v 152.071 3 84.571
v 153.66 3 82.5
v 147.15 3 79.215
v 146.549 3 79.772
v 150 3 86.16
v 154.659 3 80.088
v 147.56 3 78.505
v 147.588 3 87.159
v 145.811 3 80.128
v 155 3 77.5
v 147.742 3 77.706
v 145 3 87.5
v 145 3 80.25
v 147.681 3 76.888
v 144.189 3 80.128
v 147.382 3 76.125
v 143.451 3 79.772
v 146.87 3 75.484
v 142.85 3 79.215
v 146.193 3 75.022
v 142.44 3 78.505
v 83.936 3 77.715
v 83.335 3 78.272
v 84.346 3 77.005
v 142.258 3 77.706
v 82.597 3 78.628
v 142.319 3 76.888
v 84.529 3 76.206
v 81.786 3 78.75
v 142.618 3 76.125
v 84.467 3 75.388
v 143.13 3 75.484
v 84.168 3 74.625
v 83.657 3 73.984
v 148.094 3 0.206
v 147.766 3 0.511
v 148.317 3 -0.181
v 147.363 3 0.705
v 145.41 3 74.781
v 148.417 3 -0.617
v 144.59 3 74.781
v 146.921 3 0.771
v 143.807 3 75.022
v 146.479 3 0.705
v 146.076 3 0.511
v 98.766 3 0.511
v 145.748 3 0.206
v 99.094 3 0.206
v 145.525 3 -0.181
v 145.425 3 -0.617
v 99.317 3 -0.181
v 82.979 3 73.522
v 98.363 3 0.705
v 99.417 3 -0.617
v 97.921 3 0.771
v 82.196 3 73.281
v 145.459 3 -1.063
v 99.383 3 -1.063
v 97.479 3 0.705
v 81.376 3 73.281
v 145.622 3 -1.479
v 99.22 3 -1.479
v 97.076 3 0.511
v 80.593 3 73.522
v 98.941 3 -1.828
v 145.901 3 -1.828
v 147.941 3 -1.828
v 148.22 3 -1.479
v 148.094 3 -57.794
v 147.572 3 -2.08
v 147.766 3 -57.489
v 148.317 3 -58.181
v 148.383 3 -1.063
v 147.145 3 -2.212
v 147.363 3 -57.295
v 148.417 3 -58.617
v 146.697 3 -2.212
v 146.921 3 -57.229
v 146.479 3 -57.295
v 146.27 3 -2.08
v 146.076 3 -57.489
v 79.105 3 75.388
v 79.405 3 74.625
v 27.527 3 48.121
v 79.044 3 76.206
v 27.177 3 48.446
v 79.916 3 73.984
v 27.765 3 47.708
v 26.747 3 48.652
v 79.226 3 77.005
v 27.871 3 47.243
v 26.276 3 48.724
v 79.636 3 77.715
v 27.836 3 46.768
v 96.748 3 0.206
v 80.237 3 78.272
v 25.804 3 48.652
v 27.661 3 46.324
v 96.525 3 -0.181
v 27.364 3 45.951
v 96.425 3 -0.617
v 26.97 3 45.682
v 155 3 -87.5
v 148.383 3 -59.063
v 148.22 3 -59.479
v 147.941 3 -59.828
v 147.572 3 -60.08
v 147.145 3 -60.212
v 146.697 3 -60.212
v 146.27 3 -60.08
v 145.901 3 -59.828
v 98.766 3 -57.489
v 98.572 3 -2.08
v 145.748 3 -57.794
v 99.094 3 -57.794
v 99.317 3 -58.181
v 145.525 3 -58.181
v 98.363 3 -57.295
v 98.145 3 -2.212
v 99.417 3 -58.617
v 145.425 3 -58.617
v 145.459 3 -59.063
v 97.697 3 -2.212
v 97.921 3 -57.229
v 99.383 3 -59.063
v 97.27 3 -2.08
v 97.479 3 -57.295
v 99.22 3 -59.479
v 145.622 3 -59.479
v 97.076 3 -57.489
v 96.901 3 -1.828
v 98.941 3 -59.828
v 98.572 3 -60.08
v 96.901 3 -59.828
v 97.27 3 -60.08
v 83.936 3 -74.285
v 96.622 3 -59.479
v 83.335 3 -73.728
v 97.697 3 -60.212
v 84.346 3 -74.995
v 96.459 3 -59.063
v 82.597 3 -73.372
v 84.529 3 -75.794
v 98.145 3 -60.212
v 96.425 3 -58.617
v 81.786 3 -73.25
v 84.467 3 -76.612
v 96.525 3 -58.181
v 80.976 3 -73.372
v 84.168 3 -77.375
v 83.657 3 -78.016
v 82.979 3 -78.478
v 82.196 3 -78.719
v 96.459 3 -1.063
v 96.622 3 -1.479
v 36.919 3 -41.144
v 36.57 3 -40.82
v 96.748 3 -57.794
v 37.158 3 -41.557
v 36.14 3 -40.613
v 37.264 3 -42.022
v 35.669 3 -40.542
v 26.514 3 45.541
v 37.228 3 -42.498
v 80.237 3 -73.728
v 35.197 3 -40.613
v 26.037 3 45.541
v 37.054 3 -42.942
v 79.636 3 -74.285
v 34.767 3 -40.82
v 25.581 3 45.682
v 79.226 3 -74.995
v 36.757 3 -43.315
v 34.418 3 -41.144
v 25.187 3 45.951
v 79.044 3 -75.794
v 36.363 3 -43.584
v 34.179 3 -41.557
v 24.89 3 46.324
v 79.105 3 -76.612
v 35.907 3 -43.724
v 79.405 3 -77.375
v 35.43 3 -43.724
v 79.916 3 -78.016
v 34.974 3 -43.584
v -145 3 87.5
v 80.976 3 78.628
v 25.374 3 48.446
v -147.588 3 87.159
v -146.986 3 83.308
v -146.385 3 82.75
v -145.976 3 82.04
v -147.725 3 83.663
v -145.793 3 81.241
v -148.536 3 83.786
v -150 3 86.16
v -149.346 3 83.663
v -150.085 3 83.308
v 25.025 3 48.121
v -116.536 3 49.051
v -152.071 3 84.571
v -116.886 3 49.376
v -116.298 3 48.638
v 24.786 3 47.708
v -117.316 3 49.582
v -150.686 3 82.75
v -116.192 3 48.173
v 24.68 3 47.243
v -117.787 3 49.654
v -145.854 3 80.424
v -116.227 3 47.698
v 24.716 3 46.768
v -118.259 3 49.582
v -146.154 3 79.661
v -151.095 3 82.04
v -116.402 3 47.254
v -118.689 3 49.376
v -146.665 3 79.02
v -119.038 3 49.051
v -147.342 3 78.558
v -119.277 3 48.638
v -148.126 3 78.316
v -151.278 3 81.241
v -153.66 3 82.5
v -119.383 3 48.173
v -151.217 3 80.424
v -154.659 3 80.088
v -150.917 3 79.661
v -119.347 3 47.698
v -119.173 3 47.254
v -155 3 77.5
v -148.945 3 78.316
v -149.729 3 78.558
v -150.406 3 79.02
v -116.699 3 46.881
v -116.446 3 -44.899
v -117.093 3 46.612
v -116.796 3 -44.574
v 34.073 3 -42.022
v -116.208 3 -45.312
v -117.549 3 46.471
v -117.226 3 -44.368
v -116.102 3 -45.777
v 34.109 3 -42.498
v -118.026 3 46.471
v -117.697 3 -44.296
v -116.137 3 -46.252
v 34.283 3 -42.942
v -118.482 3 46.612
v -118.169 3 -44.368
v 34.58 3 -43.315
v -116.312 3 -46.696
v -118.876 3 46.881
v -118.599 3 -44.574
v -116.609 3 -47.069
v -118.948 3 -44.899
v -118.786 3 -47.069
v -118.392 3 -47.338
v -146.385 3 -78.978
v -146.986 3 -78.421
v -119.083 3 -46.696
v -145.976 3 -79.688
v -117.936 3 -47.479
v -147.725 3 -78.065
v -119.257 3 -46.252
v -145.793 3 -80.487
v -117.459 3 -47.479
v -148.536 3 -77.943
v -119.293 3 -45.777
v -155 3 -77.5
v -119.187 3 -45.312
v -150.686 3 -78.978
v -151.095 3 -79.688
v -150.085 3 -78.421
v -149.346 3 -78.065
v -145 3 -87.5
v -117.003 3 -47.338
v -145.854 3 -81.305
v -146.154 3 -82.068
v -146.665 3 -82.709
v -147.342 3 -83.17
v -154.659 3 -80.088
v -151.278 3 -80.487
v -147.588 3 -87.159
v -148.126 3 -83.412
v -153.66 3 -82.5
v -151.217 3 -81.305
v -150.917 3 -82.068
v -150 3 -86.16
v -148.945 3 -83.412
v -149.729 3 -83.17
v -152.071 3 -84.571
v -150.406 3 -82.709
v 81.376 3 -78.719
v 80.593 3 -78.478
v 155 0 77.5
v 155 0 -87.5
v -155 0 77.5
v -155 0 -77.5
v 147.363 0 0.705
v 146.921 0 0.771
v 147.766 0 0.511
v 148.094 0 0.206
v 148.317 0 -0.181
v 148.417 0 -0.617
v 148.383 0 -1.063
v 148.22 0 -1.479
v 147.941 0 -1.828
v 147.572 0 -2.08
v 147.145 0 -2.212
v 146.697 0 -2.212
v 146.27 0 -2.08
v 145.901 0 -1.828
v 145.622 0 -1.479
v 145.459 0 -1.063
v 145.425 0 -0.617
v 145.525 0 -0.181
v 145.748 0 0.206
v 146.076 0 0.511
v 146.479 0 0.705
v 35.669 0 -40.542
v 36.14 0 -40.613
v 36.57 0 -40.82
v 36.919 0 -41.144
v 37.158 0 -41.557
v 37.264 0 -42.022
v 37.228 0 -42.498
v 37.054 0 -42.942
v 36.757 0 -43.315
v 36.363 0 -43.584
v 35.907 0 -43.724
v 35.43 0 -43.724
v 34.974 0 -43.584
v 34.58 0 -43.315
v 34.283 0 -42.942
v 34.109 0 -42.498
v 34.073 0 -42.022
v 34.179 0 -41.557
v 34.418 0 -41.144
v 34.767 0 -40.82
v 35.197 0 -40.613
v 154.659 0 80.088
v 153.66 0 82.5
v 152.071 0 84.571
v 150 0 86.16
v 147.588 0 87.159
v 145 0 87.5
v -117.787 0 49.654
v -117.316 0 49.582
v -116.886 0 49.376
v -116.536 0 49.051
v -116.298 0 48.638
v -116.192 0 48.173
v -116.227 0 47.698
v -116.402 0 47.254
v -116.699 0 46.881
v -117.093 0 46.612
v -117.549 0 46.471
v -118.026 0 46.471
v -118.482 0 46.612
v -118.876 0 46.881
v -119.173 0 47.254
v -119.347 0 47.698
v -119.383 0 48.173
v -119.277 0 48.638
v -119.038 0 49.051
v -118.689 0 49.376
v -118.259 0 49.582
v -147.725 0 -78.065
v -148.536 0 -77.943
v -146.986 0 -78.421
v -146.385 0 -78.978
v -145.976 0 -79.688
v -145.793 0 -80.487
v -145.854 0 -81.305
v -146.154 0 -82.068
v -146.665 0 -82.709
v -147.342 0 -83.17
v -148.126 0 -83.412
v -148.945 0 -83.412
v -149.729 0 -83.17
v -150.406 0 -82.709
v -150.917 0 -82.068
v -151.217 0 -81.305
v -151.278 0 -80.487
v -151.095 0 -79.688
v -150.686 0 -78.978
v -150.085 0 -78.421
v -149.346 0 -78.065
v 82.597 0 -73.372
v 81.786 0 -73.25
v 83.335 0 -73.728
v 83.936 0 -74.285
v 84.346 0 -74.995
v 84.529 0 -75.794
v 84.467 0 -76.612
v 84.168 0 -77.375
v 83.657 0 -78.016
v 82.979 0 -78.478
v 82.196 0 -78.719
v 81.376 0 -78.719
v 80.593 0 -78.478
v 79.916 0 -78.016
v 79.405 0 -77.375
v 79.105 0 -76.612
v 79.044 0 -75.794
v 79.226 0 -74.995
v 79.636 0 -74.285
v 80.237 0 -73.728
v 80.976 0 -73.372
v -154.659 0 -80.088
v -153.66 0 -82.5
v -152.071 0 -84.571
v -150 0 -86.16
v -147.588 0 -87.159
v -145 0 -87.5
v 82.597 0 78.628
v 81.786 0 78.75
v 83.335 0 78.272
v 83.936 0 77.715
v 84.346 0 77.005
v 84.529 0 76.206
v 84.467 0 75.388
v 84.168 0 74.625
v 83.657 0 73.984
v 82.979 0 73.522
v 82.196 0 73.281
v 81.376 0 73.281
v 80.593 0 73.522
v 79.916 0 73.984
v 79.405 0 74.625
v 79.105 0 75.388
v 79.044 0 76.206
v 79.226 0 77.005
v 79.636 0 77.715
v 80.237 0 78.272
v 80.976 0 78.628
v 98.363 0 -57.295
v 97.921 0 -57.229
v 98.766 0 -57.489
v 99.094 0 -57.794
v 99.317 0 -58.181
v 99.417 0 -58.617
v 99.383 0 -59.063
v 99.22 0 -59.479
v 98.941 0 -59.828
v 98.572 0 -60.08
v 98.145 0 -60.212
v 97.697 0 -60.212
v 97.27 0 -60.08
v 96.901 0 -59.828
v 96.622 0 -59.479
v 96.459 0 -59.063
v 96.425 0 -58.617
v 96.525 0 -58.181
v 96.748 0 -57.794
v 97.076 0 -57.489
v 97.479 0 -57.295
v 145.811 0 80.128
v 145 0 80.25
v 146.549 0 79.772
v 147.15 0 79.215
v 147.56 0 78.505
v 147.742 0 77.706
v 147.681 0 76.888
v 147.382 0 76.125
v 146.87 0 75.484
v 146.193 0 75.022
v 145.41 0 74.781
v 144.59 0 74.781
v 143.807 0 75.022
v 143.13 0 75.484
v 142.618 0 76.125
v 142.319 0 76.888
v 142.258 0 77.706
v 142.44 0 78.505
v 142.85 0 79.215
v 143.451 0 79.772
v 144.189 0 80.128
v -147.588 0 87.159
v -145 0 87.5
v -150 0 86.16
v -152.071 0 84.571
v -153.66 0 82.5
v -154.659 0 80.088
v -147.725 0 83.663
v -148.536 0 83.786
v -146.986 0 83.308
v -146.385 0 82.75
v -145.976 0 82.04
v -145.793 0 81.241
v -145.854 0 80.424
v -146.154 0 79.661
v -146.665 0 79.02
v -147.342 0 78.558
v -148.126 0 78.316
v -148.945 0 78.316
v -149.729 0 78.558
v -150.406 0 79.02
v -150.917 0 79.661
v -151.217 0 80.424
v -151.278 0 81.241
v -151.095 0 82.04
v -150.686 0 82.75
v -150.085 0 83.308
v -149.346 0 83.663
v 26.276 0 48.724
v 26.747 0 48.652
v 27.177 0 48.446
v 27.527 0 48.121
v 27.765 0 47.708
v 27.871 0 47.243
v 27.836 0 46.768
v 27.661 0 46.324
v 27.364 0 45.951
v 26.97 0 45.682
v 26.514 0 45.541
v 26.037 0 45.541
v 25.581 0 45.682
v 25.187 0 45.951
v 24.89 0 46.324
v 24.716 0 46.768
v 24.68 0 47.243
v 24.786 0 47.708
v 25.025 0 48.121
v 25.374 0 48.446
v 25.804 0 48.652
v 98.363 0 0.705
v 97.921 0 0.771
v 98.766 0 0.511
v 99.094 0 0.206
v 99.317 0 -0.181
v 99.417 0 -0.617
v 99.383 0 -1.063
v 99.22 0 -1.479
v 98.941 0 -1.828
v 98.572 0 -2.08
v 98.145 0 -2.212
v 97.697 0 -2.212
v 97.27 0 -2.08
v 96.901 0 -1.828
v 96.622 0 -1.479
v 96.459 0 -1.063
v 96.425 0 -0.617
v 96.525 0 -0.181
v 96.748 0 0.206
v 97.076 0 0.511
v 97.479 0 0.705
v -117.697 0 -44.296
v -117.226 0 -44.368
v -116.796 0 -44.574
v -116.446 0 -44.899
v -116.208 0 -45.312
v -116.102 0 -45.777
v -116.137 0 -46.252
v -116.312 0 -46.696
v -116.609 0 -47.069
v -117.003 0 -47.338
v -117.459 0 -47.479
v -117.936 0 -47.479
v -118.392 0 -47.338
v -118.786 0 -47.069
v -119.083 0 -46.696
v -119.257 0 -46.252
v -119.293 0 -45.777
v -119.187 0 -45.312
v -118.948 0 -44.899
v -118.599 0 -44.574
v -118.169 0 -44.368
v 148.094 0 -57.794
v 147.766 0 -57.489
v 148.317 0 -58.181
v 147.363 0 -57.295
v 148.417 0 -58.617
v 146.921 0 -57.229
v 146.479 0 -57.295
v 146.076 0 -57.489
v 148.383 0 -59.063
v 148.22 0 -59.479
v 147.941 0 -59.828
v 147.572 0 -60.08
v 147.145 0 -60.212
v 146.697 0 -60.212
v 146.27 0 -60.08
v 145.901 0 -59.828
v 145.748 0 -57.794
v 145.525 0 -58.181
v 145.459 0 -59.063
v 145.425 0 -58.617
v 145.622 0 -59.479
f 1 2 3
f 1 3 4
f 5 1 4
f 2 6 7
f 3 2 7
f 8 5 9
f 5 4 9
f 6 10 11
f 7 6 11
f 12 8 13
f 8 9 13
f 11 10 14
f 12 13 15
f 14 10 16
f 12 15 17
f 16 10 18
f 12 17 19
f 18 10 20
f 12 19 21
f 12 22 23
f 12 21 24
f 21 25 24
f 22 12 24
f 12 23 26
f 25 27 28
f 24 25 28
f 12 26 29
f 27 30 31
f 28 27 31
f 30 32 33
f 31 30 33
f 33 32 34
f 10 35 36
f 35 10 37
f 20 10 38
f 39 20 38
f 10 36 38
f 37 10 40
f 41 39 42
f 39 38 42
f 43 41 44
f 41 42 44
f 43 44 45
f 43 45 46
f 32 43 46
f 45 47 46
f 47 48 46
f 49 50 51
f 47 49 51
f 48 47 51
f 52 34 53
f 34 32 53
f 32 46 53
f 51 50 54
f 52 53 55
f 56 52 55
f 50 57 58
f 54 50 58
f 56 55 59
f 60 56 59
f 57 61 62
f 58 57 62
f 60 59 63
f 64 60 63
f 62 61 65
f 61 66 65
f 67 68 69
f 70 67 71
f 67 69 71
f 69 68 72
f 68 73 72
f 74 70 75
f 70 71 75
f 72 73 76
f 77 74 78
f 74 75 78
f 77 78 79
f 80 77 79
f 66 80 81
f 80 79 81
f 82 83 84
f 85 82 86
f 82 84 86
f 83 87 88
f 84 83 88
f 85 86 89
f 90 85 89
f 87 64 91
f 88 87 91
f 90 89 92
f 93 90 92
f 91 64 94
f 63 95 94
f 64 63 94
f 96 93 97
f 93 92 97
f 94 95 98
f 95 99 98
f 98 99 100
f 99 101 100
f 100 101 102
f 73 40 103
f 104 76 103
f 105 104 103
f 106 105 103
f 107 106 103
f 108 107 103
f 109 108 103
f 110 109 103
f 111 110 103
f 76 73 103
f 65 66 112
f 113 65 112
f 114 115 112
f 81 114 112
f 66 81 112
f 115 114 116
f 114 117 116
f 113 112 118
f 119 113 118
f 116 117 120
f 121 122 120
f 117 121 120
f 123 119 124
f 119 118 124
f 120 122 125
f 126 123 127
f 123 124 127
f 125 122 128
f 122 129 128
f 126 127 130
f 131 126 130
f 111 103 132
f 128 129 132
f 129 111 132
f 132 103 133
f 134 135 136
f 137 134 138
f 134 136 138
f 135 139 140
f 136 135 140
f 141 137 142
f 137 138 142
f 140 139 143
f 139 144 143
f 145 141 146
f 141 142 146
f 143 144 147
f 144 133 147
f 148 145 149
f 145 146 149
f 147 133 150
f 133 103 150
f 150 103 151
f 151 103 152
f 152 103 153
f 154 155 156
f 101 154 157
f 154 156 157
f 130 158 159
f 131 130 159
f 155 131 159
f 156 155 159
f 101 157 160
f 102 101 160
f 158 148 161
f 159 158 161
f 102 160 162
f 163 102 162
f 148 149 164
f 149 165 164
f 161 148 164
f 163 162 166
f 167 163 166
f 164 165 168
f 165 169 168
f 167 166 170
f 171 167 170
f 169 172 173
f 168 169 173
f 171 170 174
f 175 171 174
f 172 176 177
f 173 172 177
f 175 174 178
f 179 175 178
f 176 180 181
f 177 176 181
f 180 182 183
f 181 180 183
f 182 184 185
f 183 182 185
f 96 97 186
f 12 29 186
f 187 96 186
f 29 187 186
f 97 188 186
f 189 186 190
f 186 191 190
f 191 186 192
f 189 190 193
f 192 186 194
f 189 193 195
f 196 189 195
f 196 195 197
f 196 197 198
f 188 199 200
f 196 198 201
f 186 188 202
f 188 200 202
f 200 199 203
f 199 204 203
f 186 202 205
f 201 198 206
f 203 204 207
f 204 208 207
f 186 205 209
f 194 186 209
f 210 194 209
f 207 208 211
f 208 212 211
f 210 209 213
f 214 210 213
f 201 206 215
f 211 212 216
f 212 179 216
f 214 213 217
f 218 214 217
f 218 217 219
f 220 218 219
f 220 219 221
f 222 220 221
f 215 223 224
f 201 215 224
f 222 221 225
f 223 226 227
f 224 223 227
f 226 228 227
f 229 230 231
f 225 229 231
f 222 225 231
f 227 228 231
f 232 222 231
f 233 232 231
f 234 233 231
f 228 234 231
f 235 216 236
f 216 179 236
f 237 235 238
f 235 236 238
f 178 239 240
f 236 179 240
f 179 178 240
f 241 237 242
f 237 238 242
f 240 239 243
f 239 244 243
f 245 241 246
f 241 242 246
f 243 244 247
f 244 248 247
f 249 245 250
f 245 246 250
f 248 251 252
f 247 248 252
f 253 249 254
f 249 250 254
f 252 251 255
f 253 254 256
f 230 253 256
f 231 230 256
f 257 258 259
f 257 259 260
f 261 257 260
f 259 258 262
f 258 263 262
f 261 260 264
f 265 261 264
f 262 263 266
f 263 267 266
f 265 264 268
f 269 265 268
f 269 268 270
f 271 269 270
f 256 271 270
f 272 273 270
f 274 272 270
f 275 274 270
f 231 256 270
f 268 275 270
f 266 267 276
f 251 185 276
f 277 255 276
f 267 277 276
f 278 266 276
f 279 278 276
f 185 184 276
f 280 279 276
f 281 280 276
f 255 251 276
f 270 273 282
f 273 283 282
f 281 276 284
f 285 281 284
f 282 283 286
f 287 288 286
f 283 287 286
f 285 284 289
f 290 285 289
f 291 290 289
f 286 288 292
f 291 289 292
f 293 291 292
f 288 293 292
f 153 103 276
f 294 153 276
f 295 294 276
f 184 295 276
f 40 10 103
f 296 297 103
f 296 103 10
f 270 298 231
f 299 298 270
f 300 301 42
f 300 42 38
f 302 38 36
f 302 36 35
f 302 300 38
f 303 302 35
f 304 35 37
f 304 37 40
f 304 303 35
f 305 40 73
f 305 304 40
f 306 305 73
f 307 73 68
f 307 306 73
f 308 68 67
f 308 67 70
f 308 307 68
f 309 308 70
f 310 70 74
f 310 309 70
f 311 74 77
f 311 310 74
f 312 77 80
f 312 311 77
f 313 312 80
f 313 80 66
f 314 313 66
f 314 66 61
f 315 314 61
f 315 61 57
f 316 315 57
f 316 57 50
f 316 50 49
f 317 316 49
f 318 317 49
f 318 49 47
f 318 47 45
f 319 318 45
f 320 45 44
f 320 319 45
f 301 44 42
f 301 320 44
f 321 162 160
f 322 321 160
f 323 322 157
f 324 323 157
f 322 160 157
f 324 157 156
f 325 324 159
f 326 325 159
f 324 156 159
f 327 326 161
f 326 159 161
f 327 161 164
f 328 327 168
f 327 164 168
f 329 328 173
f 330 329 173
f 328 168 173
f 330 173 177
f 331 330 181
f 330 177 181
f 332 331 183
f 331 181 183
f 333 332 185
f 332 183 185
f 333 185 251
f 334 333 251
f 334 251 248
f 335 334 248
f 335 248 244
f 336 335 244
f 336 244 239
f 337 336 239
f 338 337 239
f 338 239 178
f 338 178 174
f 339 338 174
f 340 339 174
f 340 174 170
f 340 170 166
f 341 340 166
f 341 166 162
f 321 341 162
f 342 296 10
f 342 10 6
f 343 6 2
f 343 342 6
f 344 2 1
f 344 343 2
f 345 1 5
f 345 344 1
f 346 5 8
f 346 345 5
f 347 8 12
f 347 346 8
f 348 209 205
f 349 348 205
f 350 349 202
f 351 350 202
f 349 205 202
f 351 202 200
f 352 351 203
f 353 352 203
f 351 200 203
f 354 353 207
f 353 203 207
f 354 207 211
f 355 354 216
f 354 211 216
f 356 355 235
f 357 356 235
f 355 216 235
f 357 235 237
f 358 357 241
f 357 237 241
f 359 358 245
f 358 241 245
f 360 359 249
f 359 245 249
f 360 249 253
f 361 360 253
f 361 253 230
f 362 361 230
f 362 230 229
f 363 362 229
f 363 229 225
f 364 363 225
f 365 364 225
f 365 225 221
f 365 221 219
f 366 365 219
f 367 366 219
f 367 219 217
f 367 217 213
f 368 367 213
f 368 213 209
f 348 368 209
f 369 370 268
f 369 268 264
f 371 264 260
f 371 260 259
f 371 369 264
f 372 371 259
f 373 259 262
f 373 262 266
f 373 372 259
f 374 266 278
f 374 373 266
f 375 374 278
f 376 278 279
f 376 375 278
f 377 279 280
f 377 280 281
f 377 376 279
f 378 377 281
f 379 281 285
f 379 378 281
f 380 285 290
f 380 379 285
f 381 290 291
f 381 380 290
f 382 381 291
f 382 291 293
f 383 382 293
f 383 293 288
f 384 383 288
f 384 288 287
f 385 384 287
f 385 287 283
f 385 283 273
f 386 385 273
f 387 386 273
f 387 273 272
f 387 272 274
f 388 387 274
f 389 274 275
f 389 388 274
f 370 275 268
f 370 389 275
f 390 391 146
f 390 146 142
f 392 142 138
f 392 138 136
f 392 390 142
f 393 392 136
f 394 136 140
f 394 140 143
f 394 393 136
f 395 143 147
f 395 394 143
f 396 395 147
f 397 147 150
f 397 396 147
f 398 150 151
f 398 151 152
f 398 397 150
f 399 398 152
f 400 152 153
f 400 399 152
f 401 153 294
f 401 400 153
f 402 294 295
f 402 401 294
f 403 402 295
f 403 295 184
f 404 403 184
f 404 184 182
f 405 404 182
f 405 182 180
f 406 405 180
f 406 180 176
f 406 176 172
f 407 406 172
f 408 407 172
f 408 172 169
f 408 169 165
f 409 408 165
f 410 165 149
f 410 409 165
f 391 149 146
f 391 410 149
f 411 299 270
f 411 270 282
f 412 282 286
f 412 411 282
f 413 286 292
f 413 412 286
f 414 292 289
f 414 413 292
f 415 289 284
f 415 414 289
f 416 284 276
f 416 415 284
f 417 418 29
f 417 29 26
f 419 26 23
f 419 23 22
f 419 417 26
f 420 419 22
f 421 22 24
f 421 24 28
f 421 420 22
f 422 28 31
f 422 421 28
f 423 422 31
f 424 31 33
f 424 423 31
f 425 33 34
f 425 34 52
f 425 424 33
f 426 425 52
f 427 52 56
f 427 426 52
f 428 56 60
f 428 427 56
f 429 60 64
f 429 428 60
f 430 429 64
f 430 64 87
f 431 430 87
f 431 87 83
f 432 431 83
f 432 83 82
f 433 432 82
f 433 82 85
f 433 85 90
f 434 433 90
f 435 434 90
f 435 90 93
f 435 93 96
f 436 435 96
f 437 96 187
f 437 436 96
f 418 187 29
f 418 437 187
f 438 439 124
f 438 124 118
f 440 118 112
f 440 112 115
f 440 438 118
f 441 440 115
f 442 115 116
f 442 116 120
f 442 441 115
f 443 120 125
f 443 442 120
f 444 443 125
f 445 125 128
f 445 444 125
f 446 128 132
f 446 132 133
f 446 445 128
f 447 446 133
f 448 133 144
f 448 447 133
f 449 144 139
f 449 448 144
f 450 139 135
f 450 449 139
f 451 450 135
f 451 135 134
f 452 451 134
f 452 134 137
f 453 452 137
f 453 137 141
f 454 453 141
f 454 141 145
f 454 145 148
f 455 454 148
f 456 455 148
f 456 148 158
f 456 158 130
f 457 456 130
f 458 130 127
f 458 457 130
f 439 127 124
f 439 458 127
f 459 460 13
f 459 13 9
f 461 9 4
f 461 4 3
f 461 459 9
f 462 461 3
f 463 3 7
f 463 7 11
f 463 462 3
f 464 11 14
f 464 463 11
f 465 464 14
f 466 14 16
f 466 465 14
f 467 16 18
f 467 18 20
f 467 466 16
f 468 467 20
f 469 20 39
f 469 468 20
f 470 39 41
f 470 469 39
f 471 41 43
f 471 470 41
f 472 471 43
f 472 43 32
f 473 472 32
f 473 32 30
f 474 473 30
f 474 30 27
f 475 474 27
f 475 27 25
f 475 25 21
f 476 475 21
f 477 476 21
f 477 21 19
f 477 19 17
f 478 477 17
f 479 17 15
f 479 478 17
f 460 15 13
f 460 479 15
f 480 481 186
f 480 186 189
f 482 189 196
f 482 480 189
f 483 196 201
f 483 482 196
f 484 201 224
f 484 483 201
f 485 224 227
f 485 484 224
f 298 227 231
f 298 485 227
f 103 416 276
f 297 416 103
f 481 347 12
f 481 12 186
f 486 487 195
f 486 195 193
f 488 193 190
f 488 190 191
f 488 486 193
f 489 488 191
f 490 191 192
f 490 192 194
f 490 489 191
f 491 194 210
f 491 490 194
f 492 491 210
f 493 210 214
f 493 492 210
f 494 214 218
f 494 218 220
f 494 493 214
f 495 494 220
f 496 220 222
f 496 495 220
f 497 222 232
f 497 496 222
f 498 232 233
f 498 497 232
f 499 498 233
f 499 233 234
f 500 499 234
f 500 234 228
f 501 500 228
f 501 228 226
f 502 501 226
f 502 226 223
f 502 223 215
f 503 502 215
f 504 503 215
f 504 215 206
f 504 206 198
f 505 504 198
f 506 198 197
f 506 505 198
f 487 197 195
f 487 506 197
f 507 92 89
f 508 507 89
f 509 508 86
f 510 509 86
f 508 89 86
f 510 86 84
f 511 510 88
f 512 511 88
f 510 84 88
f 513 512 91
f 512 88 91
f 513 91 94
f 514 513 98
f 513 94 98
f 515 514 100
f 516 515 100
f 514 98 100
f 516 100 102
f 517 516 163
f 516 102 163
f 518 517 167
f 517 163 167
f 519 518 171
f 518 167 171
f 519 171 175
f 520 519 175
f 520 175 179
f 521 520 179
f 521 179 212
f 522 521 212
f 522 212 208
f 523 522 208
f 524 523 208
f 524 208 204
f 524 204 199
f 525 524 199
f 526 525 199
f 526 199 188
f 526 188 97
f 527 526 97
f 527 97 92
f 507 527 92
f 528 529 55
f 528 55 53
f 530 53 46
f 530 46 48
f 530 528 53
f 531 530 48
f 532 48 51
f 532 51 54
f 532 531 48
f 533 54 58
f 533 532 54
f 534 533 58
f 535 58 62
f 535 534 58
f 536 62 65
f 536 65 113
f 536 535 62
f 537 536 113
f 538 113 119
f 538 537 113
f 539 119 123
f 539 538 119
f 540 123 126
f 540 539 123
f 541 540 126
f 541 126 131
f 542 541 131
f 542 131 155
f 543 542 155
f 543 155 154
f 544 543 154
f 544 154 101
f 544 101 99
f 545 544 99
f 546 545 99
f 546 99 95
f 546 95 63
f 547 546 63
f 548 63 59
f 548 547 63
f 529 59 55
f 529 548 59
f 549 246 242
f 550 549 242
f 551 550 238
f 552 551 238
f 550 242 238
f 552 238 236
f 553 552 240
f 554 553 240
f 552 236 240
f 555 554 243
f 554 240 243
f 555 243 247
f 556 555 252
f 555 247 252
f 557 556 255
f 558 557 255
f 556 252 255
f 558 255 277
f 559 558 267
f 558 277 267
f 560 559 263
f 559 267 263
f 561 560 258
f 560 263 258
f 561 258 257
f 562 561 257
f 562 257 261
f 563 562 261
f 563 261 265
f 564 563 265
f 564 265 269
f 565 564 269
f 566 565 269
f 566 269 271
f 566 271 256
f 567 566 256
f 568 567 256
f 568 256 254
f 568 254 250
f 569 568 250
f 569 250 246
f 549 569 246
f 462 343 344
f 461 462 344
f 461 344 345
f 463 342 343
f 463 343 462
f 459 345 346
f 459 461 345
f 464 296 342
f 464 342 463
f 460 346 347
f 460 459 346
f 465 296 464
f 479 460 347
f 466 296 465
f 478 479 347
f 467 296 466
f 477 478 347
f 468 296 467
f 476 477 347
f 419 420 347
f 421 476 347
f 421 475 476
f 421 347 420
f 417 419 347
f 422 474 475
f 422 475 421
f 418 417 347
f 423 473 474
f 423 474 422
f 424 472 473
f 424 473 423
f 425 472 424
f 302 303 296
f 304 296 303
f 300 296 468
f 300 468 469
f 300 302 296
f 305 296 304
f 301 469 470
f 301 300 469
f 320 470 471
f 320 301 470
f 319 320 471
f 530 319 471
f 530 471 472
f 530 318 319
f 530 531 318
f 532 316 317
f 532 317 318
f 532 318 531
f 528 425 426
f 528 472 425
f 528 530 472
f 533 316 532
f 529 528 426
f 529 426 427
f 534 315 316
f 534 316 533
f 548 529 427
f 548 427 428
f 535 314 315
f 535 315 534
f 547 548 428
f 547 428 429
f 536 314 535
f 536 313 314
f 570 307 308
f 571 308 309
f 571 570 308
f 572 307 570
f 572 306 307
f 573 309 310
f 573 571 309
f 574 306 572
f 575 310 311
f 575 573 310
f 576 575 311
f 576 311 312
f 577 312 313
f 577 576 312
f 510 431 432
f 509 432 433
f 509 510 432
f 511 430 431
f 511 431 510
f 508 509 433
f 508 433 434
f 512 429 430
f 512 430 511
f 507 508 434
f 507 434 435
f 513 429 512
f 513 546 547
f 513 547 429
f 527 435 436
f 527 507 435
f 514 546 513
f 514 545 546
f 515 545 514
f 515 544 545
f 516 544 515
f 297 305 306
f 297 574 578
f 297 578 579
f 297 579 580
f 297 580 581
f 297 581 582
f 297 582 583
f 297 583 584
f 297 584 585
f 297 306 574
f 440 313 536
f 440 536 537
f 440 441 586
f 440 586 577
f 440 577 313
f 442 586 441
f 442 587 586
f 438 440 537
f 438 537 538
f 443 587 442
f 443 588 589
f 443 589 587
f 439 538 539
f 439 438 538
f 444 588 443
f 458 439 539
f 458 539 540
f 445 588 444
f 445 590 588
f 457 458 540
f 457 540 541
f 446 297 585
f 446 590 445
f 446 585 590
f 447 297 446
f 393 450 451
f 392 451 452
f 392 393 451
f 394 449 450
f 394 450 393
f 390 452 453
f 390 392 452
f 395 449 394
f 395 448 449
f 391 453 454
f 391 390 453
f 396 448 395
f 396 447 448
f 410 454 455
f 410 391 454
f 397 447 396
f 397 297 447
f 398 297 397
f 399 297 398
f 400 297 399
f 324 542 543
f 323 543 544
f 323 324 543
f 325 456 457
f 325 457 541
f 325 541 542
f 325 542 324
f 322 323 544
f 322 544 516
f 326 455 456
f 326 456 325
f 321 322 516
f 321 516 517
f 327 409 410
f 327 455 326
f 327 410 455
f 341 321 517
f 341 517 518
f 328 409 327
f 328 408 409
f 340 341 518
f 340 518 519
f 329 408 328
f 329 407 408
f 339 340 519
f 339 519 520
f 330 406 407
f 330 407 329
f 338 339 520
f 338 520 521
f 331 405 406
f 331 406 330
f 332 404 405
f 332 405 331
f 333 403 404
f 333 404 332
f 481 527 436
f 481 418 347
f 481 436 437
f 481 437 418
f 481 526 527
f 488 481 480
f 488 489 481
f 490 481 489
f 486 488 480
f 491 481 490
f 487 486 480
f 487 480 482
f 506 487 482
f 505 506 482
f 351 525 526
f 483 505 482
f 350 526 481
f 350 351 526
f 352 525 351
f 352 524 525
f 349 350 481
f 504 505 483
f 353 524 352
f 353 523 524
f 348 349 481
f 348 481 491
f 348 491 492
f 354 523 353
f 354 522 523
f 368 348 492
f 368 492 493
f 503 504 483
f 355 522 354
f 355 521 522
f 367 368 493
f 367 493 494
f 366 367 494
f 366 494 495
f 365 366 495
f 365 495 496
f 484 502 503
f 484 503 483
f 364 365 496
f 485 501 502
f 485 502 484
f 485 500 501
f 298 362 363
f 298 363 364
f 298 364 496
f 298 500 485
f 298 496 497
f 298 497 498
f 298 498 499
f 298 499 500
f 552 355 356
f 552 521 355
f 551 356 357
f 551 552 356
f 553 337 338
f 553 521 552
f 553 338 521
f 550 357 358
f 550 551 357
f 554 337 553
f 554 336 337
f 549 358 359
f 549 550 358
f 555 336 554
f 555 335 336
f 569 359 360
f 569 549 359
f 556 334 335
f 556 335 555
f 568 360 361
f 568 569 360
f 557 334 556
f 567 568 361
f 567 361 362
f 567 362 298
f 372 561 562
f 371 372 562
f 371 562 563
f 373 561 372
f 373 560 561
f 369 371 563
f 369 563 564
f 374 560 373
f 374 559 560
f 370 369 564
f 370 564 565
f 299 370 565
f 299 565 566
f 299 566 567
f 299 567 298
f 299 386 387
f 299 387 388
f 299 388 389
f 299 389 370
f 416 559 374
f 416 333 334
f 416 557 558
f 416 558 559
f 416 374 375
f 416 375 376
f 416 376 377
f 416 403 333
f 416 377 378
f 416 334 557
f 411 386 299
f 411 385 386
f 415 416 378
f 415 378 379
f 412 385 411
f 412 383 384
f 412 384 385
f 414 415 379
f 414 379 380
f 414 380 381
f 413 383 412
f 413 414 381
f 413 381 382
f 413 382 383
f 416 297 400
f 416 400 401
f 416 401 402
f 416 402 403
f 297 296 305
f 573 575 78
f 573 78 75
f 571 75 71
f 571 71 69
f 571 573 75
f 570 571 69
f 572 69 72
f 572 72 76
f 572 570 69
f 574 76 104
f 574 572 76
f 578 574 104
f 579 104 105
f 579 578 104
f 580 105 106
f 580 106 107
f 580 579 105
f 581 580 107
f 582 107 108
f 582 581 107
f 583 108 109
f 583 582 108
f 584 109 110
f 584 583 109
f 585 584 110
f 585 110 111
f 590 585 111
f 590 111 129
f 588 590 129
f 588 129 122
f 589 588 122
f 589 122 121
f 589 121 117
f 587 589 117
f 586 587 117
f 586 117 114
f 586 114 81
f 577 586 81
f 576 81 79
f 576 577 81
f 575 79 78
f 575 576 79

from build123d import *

# Parameters (mm, degrees)
ESQUISSE1_R        = 2.75
ESQUISSE1_R_2      = 1.5
BOSS_EXTRU_1_DEPTH = 3
SKETCH1_R          = 1.6
CUT_EXTRUDE9_DEPTH = 10


with BuildPart() as part:
    # Esquisse1 → Boss.-Extru.1 (new body)
    with BuildSketch(Plane(origin=(0, 0, 0), x_dir=(1, 0, 0), z_dir=(0, 1, 0))):
        with BuildLine():
            Line((-145, 87.5), (155, 87.5))
            Line((155, 87.5), (155, -77.5))
            ThreePointArc((155, -77.5), (152.071067812, -84.571067812), (145, -87.5))
            Line((145, -87.5), (-145, -87.5))
            ThreePointArc((-145, -87.5), (-152.071067812, -84.571067812), (-155, -77.5))
            Line((-155, -77.5), (-155, 77.5))
            ThreePointArc((-155, 77.5), (-152.071067812, 84.571067812), (-145, 87.5))
        make_face()
        with Locations(Location((81.78624341, 76, 0), (0, 0, 270))):
            Circle(ESQUISSE1_R, mode=Mode.SUBTRACT)
        with Locations(Location((97.920945316, 58.728751177, 0), (0, 0, 270))):
            Circle(ESQUISSE1_R_2, mode=Mode.SUBTRACT)
        with Locations(Location((-148.535533906, 80.692777163, 0), (0, 0, 270))):
            Circle(ESQUISSE1_R, mode=Mode.SUBTRACT)
        with Locations(Location((-148.535533906, -81.035533906, 0), (0, 0, 270))):
            Circle(ESQUISSE1_R, mode=Mode.SUBTRACT)
        with Locations(Location((146.920945316, 58.728751177, 0), (0, 0, 270))):
            Circle(ESQUISSE1_R_2, mode=Mode.SUBTRACT)
        with Locations(Location((97.920945316, 0.728751177, 0), (0, 0, 270))):
            Circle(ESQUISSE1_R_2, mode=Mode.SUBTRACT)
        with Locations(Location((146.920945316, 0.728751177, 0), (0, 0, 270))):
            Circle(ESQUISSE1_R_2, mode=Mode.SUBTRACT)
        with Locations(Location((81.78624341, -76, 0), (0, 0, 270))):
            Circle(ESQUISSE1_R, mode=Mode.SUBTRACT)
        with Locations(Location((145, -77.5, 0), (0, 0, 270))):
            Circle(ESQUISSE1_R, mode=Mode.SUBTRACT)
    extrude(amount=BOSS_EXTRU_1_DEPTH)

    # Sketch1 → Cut-Extrude9 (cut)
    with BuildSketch(Plane(origin=(0, 3, 0), x_dir=(1, 0, 0), z_dir=(0, 1, 0))):
        with Locations(Location((35.668507743, 42.141960397, 0), (0, 0, 270))):
            Circle(SKETCH1_R)
        with Locations(Location((26.275656472, -47.123541034, 0), (0, 0, 270))):
            Circle(SKETCH1_R)
        with Locations(Location((-117.787345368, -48.053575675, 0), (0, 0, 270))):
            Circle(SKETCH1_R)
        with Locations(Location((-117.697345367, 45.896424322, 0), (0, 0, 270))):
            Circle(SKETCH1_R)
    extrude(amount=-CUT_EXTRUDE9_DEPTH, mode=Mode.SUBTRACT)


solid = part.part
